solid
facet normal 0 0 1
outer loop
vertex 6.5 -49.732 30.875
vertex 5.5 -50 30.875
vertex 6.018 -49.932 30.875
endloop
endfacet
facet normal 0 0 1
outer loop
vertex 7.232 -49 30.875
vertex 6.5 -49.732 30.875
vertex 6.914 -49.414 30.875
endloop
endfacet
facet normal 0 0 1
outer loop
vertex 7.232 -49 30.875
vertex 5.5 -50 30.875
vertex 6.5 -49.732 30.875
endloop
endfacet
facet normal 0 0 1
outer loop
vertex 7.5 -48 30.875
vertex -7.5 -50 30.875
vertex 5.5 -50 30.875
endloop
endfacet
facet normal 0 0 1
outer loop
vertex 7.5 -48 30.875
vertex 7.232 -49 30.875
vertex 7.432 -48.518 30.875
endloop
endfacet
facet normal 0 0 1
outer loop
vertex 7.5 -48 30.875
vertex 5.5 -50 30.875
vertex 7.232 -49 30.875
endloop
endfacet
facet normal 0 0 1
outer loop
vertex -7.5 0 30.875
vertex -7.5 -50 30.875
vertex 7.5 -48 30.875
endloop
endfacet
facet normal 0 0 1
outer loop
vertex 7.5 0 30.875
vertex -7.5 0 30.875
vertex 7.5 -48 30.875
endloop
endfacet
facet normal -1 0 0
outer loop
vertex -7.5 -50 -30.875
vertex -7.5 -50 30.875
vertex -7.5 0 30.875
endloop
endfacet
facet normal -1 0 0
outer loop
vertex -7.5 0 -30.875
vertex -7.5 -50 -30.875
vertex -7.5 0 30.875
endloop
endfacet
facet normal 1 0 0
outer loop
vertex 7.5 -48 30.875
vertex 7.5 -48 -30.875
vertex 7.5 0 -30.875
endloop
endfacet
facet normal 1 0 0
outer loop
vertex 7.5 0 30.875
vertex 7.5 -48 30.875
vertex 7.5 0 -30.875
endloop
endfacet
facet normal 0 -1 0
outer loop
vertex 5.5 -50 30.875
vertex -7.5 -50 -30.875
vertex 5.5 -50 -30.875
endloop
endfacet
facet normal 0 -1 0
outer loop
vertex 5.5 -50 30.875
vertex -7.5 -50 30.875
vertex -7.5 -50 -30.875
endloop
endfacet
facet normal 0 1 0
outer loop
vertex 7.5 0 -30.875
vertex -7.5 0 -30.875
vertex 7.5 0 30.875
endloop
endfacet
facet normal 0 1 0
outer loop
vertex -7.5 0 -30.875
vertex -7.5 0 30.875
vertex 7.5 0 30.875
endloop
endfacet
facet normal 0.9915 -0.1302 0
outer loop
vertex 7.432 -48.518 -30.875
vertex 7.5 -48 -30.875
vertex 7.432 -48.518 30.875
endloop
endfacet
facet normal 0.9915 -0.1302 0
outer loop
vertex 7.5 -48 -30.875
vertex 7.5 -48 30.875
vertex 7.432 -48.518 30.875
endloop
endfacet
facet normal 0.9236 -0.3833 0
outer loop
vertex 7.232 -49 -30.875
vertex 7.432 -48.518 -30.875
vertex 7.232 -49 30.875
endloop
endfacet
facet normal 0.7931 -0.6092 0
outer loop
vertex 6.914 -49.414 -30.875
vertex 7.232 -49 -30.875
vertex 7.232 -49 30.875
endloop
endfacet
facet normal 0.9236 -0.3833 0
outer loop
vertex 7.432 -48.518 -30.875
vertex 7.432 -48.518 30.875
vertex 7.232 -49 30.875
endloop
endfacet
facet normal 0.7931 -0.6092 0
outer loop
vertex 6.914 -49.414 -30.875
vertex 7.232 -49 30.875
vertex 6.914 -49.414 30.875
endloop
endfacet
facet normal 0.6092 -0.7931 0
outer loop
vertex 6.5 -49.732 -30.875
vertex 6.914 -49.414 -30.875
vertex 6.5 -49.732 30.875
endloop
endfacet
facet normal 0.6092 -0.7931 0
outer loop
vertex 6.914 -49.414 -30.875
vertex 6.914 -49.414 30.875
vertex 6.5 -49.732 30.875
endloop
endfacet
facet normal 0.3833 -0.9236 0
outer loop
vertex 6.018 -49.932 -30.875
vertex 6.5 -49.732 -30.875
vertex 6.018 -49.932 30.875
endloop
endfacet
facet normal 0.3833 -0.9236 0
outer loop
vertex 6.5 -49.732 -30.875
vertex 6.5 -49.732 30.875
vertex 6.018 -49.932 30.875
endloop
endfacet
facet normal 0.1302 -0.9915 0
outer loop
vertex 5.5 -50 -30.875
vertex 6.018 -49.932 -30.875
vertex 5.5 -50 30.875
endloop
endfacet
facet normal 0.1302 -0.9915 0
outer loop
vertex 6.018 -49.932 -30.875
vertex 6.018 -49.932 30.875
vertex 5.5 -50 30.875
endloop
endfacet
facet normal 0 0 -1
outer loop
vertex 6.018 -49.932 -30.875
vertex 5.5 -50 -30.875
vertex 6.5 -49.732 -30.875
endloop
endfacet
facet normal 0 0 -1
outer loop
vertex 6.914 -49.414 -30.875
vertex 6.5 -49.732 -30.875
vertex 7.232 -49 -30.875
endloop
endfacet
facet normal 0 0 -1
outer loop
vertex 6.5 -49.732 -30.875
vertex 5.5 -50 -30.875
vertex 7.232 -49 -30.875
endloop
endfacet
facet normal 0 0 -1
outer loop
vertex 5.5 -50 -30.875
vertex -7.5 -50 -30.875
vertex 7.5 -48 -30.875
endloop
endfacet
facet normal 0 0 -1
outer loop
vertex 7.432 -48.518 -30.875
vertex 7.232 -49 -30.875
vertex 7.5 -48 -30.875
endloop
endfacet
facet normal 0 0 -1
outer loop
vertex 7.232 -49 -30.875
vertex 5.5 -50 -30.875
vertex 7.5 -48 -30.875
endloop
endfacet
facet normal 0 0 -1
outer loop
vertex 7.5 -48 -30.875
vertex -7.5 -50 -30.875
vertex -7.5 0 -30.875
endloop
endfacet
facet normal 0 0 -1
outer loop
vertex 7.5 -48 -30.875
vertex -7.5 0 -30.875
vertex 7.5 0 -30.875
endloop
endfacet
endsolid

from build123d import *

# Parameters (mm, degrees)
SKETCH1_W           = 15
SKETCH1_H           = 50
BOSS_EXTRUDE1_DEPTH = 30.875
FILLET1_R           = 2


with BuildPart() as part:
    # Sketch1 → Boss-Extrude1 (new, symmetric)
    with BuildSketch(Plane.XY):
        with Locations((0, -25)):
            Rectangle(SKETCH1_W, SKETCH1_H)
    extrude(amount=BOSS_EXTRUDE1_DEPTH, both=True)

    # Fillet1
    fillet1_edges = [part.edges().sort_by_distance(p)[0] for p in [
        (7.5, -50, 0),
    ]]
    fillet(fillet1_edges, radius=FILLET1_R)


solid = part.part
